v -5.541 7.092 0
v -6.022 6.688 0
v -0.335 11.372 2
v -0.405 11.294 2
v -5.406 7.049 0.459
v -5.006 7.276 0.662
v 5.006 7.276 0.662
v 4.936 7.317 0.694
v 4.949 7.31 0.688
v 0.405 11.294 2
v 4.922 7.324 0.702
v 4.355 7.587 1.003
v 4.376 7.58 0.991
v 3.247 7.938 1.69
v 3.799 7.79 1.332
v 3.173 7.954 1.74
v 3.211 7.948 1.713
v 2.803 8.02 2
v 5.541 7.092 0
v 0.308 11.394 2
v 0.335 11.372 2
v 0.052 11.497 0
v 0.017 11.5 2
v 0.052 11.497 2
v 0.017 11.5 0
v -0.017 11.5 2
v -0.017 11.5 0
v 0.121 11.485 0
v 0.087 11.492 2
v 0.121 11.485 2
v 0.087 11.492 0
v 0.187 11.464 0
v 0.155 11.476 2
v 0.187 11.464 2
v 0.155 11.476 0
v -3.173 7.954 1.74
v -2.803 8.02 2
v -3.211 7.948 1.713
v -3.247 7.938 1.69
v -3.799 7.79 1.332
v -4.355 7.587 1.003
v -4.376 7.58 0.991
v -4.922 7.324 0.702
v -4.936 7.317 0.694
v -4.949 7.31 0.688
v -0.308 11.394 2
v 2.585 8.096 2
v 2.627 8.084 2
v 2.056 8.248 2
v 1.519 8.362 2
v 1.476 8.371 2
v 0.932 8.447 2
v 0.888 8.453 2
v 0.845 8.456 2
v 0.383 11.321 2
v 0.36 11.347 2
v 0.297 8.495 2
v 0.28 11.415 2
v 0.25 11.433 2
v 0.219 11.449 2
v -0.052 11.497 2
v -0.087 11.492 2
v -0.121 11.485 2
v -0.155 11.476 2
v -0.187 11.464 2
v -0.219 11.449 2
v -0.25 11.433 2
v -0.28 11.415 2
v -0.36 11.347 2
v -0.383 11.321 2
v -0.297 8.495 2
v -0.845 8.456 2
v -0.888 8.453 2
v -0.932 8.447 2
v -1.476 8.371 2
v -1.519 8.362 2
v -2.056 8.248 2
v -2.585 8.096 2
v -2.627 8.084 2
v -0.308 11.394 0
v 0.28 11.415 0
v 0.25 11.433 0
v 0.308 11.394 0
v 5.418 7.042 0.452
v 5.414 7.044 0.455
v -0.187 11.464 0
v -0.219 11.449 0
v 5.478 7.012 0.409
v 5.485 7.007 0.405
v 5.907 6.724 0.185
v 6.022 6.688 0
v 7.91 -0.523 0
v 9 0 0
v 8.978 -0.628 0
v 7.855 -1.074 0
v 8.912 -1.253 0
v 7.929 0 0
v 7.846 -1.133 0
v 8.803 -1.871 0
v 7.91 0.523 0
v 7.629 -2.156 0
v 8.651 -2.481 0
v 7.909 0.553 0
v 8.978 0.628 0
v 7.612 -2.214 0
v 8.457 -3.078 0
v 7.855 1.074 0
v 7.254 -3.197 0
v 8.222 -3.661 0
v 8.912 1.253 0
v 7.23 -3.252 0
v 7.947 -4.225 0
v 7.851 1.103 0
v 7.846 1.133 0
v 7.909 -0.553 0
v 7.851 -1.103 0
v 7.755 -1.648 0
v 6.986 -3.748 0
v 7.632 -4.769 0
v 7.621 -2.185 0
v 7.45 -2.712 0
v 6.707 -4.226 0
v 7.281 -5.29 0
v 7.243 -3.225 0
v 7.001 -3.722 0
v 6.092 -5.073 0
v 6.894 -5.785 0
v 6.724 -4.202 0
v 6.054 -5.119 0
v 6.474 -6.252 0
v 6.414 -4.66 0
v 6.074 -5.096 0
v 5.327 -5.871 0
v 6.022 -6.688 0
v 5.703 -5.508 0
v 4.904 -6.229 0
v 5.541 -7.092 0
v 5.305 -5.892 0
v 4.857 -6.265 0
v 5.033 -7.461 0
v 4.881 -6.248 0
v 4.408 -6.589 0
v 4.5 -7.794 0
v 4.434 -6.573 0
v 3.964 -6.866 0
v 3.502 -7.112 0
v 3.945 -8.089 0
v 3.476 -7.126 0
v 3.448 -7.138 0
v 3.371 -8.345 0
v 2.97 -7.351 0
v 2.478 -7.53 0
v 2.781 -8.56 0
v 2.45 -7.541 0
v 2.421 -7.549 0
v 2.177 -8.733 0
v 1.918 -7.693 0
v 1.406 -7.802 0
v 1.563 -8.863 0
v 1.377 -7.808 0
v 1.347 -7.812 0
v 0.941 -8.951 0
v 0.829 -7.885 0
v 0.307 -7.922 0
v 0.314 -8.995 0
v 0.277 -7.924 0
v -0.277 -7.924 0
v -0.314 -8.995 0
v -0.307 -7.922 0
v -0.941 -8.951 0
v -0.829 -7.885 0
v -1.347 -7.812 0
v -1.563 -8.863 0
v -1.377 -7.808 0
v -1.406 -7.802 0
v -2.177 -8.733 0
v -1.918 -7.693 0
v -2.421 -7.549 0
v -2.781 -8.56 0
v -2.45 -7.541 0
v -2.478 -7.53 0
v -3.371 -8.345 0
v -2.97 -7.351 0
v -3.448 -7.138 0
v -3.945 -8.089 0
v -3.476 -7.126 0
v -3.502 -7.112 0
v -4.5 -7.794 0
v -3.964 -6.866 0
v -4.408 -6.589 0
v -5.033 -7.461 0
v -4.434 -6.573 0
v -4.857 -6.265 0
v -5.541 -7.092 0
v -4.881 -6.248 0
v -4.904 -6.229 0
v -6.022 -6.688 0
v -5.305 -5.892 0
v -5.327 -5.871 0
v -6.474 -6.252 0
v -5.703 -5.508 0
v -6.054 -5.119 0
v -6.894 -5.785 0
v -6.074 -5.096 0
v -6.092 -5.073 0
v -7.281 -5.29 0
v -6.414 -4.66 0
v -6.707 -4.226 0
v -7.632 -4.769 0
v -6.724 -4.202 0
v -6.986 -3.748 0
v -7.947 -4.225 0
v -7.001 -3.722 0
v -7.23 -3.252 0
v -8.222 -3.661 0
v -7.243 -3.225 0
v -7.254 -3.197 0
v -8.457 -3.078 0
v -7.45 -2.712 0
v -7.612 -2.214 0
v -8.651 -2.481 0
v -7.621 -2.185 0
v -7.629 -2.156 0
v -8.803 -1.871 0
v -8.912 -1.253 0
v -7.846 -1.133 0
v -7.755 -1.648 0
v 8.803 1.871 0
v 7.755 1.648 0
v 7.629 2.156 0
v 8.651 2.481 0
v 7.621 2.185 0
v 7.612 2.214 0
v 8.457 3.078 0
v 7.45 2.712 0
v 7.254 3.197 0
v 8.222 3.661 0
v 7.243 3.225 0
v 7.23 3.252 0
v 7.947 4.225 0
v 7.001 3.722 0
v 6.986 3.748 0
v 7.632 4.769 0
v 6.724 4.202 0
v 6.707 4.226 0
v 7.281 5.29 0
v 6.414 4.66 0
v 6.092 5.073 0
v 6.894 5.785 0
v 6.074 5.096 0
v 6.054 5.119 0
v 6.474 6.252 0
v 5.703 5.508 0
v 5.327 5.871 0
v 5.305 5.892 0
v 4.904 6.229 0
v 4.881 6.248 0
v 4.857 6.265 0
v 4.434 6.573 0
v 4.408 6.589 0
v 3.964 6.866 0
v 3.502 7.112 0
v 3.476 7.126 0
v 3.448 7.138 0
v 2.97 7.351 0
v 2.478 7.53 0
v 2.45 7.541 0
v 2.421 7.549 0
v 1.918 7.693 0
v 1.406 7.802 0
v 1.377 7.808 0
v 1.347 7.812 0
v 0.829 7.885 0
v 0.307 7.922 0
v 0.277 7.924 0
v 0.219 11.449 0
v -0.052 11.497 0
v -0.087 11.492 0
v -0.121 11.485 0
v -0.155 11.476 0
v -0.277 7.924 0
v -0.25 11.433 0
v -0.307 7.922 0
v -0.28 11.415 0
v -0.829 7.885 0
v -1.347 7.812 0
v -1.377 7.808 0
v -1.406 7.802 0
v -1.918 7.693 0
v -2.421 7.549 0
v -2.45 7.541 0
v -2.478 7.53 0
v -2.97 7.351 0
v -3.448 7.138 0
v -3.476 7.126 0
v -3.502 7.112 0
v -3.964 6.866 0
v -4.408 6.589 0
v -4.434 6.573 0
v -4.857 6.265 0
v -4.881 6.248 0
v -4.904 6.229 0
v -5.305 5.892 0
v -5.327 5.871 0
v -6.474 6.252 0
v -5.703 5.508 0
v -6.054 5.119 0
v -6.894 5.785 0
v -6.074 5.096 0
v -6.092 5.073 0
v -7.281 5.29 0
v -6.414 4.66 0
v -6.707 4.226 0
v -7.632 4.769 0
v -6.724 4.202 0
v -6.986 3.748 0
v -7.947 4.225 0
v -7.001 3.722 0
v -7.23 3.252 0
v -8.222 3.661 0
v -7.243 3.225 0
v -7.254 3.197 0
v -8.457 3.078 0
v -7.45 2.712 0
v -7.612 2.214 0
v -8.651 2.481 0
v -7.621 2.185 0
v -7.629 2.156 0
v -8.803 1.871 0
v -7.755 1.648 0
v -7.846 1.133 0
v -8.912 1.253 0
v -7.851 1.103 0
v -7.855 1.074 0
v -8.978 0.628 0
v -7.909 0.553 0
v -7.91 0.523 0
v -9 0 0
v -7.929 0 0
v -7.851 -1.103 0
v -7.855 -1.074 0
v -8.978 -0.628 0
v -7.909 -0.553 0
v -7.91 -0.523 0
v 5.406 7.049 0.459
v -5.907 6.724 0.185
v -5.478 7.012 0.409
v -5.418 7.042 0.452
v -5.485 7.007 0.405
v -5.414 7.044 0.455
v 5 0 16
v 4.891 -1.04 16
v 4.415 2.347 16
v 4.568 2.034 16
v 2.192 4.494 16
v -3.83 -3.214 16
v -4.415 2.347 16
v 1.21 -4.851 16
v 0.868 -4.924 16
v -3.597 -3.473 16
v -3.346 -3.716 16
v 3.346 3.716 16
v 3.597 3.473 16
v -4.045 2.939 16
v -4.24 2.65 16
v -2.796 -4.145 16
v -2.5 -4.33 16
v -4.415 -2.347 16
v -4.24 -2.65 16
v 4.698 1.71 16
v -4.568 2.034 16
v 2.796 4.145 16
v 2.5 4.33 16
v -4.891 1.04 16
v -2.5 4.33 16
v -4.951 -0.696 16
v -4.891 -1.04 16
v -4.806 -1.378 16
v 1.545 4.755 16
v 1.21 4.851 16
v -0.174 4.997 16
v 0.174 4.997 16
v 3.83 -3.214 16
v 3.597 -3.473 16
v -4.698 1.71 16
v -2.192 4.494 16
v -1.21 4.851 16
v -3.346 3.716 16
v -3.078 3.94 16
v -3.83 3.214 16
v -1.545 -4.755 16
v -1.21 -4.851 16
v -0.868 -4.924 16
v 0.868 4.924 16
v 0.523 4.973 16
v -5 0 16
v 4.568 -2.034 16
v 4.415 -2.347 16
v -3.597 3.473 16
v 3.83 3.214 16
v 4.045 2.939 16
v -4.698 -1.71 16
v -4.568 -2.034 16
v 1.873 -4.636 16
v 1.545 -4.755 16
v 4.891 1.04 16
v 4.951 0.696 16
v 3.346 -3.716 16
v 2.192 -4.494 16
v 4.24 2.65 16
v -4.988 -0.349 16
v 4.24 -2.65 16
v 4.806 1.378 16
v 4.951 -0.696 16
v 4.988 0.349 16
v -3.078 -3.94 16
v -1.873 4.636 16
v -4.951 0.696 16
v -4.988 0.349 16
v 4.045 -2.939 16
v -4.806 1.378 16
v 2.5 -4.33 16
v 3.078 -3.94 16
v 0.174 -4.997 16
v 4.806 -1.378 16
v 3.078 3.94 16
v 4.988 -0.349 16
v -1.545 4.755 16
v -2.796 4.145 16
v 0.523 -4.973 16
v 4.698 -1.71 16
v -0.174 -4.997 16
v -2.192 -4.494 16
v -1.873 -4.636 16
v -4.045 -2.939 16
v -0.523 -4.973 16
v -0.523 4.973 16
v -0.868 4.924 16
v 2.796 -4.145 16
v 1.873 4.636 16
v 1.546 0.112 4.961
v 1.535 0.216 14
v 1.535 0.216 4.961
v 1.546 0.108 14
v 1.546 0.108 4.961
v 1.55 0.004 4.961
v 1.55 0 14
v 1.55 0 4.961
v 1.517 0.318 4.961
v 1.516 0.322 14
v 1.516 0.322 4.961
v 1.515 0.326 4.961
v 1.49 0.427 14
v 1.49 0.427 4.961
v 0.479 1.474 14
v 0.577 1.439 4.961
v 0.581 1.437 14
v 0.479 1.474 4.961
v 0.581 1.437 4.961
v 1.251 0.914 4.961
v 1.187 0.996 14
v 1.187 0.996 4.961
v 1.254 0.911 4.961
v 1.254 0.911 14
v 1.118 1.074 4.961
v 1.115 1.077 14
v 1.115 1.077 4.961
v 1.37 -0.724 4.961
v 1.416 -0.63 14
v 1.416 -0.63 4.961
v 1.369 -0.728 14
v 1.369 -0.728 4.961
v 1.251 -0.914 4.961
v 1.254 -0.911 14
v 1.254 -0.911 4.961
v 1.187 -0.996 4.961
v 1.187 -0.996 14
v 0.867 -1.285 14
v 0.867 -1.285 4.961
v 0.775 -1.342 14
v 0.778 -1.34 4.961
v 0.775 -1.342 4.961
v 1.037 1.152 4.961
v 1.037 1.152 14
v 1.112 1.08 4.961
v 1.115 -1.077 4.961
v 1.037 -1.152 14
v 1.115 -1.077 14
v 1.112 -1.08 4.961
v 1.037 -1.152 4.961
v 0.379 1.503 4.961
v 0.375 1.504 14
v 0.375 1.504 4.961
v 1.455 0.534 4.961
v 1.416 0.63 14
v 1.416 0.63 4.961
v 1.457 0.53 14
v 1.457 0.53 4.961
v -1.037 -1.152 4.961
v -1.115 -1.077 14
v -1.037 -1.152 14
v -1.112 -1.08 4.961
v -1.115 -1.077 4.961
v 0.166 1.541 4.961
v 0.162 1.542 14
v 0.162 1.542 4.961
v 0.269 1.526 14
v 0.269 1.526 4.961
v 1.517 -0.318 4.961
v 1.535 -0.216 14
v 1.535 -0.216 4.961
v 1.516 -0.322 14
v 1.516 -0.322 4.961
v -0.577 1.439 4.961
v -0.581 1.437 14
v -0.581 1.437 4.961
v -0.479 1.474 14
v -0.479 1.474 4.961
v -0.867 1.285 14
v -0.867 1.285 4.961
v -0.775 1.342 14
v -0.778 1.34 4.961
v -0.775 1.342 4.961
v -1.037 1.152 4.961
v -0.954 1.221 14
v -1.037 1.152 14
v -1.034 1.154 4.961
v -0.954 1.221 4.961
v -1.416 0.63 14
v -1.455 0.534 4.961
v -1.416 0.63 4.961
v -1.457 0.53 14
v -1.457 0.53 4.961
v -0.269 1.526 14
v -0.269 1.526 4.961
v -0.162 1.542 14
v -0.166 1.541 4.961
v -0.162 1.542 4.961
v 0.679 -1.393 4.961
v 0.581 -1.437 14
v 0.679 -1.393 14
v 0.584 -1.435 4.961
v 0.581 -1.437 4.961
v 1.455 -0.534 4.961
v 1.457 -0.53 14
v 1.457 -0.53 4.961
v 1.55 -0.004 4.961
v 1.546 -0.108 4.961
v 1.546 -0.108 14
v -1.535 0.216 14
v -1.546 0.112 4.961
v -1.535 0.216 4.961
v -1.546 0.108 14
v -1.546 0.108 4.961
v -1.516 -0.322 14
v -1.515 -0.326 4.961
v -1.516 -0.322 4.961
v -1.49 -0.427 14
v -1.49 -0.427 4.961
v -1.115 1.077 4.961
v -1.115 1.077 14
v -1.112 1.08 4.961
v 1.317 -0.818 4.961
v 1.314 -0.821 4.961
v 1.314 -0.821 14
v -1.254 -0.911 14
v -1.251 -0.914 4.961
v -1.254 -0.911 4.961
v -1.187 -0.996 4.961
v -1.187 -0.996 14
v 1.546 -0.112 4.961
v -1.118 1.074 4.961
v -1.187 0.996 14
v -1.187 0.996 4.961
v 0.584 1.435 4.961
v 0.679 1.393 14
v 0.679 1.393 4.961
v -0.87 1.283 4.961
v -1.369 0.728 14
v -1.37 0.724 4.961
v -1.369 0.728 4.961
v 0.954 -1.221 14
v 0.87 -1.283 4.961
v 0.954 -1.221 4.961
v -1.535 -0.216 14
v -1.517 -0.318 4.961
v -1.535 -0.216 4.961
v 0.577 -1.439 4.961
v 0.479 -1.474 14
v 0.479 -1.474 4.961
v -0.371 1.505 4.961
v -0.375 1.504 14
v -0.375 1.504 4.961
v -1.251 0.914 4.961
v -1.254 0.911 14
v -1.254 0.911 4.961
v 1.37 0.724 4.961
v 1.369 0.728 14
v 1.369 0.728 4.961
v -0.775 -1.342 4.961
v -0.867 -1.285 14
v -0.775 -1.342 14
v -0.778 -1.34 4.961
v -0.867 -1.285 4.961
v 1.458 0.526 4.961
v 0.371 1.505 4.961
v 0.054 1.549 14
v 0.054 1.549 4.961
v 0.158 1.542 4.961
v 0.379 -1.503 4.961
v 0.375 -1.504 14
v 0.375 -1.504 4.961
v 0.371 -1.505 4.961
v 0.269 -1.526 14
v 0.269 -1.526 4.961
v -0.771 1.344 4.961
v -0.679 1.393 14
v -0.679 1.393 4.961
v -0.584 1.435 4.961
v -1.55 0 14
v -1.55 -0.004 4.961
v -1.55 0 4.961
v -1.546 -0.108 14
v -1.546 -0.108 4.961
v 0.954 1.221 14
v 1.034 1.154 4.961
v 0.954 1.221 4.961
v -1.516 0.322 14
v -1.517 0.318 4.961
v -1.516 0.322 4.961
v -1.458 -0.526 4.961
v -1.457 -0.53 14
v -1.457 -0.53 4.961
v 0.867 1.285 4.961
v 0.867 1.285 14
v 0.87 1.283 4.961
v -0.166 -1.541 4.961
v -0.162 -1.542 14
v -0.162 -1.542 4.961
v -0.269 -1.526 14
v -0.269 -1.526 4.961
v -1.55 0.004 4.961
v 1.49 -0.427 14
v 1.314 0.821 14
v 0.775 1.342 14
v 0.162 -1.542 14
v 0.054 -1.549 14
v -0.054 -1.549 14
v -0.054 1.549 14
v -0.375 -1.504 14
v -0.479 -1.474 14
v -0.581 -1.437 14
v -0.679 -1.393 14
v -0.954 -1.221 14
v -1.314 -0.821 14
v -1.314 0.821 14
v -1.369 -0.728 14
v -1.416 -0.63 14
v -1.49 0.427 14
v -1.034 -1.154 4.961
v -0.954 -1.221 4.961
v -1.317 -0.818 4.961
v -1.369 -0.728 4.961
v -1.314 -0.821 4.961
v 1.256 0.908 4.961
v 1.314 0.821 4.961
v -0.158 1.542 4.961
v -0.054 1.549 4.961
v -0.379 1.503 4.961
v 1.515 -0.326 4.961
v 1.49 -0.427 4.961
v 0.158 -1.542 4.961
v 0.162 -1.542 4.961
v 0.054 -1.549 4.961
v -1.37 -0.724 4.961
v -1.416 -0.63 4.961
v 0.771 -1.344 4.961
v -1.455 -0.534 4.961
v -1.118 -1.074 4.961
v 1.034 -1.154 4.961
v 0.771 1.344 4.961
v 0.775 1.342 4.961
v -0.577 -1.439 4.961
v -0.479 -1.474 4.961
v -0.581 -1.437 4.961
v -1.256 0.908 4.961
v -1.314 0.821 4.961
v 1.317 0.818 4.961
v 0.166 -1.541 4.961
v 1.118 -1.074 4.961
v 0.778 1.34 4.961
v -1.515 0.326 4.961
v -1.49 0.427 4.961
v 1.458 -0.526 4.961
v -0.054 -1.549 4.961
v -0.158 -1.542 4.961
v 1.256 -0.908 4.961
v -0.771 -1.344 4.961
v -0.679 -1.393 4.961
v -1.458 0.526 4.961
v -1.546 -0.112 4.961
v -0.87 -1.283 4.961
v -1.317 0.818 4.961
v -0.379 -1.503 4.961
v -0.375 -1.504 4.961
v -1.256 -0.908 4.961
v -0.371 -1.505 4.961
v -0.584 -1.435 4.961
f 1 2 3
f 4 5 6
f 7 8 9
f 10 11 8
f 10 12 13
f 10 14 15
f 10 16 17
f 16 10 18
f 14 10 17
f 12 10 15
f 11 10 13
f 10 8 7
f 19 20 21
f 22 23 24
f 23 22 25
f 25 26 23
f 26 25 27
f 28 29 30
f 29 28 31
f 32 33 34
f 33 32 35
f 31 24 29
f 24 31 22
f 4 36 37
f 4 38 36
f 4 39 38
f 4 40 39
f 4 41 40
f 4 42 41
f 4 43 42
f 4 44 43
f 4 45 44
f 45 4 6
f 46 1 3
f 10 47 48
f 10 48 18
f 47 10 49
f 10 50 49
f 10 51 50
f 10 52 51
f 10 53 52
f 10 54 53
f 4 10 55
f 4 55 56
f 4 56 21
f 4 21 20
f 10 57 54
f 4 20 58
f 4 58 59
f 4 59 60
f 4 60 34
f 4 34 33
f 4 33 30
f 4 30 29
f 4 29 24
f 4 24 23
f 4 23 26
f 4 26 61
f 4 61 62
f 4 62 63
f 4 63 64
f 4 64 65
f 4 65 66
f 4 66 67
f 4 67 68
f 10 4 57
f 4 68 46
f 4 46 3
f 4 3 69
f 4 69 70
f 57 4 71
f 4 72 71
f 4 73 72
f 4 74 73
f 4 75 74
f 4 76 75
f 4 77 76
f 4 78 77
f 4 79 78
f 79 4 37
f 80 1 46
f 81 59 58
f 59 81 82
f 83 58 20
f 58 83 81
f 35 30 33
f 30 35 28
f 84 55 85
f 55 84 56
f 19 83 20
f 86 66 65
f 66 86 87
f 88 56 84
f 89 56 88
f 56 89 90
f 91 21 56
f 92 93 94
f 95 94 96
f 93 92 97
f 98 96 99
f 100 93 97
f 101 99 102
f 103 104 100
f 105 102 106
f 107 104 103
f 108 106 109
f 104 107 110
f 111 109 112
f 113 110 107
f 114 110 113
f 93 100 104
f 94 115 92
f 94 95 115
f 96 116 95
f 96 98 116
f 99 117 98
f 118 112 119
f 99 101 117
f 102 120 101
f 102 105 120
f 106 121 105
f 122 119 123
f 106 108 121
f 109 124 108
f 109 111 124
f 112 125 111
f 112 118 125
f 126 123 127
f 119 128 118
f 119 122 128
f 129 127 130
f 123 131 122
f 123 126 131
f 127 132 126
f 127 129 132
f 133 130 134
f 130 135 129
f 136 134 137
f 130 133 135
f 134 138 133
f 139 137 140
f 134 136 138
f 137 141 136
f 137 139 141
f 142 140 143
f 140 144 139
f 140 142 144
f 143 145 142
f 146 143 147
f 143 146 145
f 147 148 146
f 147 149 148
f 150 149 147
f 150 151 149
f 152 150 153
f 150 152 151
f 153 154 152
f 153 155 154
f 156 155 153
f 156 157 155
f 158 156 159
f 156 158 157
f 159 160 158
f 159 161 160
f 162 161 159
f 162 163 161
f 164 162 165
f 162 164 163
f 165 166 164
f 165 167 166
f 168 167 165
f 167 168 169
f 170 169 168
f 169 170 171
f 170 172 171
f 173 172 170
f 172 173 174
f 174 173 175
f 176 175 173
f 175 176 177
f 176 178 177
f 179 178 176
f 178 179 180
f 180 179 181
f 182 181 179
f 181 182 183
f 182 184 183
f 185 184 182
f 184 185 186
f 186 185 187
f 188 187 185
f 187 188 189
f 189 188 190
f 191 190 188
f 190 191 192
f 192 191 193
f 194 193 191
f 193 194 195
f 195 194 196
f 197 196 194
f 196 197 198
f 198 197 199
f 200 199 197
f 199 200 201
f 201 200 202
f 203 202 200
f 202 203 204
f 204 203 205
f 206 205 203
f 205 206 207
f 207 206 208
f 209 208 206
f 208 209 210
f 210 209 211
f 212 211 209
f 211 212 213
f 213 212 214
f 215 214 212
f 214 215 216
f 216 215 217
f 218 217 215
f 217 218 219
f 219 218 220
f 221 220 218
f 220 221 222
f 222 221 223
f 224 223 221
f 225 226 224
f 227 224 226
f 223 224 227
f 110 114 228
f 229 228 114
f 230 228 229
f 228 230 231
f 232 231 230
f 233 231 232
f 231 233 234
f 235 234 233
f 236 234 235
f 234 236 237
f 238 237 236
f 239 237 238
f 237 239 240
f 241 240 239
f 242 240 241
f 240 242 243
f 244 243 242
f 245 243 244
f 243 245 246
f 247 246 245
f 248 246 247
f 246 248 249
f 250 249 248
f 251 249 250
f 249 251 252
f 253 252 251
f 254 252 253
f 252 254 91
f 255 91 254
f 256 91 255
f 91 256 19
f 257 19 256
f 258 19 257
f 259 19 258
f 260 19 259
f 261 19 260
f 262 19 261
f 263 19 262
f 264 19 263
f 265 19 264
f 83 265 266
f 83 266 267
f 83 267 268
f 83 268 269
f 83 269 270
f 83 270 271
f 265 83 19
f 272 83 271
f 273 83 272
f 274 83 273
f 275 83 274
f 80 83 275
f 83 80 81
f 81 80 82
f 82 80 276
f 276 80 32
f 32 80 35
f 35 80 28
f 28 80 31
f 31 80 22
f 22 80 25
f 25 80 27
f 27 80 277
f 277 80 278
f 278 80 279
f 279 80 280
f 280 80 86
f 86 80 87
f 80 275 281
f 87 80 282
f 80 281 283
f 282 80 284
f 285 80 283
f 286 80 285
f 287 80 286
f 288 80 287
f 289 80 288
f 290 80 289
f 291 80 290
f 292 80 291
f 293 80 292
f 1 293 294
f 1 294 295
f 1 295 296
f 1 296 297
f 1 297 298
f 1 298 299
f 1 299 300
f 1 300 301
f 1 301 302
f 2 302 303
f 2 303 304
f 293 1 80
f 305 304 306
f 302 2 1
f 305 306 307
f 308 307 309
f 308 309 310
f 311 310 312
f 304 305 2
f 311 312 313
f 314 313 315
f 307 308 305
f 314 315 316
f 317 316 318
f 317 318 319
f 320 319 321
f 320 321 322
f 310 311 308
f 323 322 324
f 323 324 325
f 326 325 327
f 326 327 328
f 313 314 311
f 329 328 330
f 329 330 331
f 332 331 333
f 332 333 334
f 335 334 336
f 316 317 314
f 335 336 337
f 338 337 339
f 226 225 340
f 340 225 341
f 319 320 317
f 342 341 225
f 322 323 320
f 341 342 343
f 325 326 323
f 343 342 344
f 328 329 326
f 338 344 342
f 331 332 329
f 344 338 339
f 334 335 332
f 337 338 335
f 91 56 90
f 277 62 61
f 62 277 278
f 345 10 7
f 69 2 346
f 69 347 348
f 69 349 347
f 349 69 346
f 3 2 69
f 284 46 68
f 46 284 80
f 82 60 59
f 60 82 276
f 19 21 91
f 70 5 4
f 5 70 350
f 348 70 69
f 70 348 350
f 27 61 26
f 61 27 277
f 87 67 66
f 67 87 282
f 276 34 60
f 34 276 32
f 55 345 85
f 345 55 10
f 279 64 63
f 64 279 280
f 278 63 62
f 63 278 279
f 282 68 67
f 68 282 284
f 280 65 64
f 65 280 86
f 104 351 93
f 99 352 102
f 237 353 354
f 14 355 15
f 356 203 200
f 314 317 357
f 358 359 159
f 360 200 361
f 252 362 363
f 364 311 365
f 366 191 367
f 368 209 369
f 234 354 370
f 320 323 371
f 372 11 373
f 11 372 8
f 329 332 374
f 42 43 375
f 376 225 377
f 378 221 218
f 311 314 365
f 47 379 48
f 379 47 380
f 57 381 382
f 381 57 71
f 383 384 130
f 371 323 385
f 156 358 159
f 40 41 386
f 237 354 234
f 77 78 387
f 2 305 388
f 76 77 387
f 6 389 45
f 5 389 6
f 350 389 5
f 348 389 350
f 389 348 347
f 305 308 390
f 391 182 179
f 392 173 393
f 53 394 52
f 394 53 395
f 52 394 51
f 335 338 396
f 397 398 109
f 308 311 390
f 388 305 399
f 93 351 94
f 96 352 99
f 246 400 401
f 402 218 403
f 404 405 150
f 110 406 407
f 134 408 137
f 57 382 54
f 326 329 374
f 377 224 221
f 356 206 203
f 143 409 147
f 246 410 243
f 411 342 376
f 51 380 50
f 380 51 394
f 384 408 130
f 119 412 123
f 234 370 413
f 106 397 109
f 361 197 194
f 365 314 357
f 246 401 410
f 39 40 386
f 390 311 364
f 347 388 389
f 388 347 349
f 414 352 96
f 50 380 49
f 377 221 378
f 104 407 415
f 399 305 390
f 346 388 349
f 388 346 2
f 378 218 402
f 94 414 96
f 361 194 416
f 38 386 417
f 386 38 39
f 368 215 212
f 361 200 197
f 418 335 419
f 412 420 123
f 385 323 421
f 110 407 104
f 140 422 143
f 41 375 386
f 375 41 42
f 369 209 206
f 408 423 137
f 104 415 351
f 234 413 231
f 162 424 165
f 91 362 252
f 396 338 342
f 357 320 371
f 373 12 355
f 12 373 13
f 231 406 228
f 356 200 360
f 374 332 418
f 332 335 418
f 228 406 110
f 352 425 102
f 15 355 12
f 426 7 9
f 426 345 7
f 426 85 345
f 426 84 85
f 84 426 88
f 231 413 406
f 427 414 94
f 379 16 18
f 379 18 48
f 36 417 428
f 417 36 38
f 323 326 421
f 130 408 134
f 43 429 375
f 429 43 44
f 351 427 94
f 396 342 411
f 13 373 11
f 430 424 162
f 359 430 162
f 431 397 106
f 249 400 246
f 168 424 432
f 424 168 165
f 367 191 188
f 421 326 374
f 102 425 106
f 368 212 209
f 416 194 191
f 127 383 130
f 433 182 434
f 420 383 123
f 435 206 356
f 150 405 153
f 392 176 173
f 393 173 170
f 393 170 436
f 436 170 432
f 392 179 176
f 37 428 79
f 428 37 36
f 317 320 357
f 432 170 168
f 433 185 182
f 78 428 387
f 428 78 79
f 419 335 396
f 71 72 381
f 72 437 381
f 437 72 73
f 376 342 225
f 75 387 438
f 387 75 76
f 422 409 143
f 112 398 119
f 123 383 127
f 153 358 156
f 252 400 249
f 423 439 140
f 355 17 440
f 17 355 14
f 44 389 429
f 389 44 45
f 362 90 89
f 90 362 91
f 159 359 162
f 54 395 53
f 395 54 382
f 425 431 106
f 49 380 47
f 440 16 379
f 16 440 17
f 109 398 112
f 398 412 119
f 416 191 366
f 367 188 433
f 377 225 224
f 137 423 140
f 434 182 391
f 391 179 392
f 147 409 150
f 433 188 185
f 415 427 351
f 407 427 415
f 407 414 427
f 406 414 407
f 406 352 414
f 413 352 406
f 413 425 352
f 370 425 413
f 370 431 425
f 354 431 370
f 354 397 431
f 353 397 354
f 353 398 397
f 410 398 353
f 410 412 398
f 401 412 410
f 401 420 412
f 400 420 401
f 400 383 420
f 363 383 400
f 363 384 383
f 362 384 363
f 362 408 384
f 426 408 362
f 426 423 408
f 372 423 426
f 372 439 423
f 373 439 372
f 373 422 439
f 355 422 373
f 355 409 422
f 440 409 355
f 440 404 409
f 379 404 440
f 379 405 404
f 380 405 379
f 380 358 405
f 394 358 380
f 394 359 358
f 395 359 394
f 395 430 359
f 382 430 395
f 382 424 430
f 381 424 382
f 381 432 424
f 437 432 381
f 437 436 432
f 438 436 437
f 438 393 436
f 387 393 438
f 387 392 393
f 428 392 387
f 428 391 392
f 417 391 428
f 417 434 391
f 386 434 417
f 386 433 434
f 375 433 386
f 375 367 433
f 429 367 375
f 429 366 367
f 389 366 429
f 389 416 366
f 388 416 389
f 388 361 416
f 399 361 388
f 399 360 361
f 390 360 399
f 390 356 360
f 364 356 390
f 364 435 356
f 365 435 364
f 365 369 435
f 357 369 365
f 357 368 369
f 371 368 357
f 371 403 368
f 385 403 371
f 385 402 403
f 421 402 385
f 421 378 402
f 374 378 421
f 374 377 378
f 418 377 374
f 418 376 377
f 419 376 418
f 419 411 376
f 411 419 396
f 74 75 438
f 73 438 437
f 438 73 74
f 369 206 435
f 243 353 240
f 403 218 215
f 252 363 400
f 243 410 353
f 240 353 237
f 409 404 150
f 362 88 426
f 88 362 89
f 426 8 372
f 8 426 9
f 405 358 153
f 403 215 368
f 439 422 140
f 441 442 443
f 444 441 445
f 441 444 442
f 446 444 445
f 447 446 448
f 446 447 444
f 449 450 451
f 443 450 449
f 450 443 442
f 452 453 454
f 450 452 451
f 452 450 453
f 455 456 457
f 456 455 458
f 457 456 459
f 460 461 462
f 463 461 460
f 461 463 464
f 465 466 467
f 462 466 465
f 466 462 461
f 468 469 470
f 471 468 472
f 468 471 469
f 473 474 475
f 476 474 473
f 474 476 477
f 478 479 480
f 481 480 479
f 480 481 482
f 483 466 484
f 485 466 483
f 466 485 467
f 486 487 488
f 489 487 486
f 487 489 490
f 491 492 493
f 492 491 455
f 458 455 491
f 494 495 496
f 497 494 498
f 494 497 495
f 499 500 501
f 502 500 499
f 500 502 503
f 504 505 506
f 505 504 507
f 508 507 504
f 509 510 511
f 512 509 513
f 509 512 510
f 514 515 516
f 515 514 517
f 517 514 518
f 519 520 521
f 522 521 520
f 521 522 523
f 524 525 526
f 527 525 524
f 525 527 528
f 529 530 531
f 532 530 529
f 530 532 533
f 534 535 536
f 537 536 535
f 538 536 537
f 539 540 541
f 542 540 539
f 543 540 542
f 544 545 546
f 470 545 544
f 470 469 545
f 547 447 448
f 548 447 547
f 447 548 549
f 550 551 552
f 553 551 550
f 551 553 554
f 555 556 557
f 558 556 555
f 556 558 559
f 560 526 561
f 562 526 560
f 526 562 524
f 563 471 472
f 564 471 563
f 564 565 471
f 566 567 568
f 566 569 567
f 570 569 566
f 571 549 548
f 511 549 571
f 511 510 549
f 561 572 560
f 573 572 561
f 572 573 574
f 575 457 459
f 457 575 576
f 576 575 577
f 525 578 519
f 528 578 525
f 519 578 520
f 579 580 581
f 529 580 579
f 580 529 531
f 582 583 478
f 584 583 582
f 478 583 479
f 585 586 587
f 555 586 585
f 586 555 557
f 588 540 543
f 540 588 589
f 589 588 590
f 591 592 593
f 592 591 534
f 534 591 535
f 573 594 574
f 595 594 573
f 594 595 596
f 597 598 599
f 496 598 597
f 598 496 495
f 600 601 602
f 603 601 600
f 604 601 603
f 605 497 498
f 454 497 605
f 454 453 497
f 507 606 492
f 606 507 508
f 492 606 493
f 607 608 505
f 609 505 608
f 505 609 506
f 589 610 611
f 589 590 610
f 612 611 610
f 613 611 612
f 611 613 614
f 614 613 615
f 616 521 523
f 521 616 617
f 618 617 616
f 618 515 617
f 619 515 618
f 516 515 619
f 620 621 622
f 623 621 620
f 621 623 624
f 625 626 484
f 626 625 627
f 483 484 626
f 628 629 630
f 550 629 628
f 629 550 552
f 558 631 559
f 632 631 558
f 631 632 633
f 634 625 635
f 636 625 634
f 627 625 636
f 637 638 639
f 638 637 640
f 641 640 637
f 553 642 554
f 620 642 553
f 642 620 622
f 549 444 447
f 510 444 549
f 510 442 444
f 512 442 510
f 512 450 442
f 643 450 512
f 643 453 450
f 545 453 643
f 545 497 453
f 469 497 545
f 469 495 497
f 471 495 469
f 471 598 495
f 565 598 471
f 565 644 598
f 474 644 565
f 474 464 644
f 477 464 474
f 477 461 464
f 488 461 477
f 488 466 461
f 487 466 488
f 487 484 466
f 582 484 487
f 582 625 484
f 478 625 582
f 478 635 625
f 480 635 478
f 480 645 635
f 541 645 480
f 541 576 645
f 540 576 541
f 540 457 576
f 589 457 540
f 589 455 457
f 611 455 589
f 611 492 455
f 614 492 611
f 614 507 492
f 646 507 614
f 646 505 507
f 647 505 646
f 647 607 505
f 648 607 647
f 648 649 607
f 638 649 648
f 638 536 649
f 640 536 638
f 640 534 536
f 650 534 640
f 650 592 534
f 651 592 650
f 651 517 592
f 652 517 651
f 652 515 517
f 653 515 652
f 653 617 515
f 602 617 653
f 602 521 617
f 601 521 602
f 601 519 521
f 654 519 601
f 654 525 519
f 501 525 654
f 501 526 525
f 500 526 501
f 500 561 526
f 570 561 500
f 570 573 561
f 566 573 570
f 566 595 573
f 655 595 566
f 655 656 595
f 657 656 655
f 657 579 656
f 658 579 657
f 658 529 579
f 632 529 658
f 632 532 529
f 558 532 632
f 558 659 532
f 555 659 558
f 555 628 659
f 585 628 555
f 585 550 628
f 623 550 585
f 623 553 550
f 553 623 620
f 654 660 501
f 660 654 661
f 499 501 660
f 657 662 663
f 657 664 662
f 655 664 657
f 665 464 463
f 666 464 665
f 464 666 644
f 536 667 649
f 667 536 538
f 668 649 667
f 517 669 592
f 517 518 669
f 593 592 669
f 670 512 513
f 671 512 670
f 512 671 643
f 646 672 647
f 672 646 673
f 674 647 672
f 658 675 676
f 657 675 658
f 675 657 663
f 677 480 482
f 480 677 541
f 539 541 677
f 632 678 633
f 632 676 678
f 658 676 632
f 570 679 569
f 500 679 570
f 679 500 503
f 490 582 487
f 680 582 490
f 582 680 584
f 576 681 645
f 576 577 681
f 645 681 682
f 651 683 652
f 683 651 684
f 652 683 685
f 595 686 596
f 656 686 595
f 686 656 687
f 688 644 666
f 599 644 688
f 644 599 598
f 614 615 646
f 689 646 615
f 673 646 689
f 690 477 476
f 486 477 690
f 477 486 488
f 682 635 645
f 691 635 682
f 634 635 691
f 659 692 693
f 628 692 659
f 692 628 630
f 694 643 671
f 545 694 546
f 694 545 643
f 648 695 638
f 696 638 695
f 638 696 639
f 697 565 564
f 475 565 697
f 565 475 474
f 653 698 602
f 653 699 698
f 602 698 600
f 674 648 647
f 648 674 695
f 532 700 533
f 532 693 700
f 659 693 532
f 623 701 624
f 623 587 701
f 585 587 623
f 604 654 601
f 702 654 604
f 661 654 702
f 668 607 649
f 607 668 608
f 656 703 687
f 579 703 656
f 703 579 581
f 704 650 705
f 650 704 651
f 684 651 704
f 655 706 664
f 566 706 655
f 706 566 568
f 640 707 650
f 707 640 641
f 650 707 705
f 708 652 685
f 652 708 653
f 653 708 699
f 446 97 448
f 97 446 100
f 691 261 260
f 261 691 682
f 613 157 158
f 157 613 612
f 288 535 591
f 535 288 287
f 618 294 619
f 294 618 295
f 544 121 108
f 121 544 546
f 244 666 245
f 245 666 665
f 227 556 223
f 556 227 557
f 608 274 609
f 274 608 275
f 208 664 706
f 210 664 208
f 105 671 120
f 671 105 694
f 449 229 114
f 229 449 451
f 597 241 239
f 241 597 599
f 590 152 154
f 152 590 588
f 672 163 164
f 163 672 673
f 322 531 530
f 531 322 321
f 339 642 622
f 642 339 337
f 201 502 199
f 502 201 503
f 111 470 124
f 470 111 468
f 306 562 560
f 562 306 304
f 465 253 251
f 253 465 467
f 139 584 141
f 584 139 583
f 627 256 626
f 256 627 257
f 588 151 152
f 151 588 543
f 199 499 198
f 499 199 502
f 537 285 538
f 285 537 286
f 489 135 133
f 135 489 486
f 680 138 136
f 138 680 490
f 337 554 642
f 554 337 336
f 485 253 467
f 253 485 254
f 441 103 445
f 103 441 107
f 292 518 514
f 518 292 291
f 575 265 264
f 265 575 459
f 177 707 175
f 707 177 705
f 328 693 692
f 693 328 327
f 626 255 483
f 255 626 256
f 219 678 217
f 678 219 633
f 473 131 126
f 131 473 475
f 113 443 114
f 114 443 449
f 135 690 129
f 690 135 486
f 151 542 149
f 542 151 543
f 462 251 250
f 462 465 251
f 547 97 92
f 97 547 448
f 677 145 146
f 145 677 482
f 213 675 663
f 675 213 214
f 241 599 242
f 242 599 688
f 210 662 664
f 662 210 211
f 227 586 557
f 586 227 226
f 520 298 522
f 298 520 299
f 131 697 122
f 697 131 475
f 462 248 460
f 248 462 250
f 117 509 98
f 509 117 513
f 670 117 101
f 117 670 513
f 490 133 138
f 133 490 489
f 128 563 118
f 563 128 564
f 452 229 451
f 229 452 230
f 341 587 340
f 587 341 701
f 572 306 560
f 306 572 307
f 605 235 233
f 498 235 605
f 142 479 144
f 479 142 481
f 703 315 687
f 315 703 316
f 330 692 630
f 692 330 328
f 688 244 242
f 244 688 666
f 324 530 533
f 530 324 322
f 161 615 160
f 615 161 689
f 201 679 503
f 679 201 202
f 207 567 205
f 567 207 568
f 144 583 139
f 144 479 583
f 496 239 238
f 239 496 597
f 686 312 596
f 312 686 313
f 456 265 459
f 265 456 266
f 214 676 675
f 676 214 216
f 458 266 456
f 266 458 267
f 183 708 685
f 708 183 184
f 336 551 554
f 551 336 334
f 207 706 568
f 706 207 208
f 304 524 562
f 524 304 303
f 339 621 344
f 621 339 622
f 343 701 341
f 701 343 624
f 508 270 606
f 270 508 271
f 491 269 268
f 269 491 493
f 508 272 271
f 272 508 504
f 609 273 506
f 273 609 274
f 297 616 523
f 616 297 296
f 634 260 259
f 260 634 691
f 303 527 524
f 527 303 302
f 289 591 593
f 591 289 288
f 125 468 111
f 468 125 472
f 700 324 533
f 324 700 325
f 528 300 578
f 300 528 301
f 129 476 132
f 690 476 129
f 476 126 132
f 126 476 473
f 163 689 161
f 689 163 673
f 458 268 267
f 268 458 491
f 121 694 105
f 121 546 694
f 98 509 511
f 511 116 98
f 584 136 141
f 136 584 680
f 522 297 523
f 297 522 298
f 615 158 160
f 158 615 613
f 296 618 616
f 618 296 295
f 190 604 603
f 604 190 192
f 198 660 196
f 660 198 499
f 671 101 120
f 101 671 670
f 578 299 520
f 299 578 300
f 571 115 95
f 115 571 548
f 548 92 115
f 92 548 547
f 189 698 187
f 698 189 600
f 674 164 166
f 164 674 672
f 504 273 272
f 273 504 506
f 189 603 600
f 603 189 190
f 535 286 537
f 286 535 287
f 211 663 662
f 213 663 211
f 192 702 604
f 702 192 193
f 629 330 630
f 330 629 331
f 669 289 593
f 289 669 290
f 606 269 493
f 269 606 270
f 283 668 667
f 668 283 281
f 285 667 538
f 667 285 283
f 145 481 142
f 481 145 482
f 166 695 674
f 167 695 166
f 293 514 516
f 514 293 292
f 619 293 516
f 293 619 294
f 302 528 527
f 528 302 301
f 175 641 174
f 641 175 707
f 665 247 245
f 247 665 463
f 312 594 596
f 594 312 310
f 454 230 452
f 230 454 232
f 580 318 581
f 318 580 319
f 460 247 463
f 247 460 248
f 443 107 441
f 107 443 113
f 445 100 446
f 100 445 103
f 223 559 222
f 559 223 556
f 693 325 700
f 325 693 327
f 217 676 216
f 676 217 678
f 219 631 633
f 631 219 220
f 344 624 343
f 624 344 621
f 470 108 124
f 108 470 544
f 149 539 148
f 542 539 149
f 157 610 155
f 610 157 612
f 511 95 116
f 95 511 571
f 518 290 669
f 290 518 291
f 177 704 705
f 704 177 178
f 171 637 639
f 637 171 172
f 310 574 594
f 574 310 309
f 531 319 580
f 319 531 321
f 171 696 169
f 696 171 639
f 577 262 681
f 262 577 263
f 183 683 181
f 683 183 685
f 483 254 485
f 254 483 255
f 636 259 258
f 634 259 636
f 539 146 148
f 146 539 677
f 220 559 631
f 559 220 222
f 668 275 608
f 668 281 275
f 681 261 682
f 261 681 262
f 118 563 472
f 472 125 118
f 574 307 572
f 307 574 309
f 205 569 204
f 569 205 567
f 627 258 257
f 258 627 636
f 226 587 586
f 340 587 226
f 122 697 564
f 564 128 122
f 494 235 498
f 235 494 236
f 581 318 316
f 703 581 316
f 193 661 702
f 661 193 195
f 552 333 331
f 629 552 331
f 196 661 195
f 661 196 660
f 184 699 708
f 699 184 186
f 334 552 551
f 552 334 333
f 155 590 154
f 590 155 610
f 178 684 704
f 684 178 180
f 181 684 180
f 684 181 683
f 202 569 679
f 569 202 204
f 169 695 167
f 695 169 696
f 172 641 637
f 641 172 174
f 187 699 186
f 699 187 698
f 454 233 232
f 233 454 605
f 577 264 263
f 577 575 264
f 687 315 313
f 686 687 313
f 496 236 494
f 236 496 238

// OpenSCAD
color("blue")difference(){
union(){
hull(){
cylinder(d1=18, d2 =14,h = 2, $fn = 90);
translate([0,11,0])cylinder(d=1, h = 2, $fn = 90);}
cylinder(d1=18, d2 = 10, h = 16, $fn = 90);

}


translate([0,0,-2])cylinder(d=3.1 ,h = 16, $fn = 90);
translate([0,0,-2])cylinder(d1=21, d2=3,h = 7, $fn = 90);
//болт крепления
//translate([0,0,8])rotate([90,0,0])cylinder(d=2.5, h = 55, $fn = 90);
}
